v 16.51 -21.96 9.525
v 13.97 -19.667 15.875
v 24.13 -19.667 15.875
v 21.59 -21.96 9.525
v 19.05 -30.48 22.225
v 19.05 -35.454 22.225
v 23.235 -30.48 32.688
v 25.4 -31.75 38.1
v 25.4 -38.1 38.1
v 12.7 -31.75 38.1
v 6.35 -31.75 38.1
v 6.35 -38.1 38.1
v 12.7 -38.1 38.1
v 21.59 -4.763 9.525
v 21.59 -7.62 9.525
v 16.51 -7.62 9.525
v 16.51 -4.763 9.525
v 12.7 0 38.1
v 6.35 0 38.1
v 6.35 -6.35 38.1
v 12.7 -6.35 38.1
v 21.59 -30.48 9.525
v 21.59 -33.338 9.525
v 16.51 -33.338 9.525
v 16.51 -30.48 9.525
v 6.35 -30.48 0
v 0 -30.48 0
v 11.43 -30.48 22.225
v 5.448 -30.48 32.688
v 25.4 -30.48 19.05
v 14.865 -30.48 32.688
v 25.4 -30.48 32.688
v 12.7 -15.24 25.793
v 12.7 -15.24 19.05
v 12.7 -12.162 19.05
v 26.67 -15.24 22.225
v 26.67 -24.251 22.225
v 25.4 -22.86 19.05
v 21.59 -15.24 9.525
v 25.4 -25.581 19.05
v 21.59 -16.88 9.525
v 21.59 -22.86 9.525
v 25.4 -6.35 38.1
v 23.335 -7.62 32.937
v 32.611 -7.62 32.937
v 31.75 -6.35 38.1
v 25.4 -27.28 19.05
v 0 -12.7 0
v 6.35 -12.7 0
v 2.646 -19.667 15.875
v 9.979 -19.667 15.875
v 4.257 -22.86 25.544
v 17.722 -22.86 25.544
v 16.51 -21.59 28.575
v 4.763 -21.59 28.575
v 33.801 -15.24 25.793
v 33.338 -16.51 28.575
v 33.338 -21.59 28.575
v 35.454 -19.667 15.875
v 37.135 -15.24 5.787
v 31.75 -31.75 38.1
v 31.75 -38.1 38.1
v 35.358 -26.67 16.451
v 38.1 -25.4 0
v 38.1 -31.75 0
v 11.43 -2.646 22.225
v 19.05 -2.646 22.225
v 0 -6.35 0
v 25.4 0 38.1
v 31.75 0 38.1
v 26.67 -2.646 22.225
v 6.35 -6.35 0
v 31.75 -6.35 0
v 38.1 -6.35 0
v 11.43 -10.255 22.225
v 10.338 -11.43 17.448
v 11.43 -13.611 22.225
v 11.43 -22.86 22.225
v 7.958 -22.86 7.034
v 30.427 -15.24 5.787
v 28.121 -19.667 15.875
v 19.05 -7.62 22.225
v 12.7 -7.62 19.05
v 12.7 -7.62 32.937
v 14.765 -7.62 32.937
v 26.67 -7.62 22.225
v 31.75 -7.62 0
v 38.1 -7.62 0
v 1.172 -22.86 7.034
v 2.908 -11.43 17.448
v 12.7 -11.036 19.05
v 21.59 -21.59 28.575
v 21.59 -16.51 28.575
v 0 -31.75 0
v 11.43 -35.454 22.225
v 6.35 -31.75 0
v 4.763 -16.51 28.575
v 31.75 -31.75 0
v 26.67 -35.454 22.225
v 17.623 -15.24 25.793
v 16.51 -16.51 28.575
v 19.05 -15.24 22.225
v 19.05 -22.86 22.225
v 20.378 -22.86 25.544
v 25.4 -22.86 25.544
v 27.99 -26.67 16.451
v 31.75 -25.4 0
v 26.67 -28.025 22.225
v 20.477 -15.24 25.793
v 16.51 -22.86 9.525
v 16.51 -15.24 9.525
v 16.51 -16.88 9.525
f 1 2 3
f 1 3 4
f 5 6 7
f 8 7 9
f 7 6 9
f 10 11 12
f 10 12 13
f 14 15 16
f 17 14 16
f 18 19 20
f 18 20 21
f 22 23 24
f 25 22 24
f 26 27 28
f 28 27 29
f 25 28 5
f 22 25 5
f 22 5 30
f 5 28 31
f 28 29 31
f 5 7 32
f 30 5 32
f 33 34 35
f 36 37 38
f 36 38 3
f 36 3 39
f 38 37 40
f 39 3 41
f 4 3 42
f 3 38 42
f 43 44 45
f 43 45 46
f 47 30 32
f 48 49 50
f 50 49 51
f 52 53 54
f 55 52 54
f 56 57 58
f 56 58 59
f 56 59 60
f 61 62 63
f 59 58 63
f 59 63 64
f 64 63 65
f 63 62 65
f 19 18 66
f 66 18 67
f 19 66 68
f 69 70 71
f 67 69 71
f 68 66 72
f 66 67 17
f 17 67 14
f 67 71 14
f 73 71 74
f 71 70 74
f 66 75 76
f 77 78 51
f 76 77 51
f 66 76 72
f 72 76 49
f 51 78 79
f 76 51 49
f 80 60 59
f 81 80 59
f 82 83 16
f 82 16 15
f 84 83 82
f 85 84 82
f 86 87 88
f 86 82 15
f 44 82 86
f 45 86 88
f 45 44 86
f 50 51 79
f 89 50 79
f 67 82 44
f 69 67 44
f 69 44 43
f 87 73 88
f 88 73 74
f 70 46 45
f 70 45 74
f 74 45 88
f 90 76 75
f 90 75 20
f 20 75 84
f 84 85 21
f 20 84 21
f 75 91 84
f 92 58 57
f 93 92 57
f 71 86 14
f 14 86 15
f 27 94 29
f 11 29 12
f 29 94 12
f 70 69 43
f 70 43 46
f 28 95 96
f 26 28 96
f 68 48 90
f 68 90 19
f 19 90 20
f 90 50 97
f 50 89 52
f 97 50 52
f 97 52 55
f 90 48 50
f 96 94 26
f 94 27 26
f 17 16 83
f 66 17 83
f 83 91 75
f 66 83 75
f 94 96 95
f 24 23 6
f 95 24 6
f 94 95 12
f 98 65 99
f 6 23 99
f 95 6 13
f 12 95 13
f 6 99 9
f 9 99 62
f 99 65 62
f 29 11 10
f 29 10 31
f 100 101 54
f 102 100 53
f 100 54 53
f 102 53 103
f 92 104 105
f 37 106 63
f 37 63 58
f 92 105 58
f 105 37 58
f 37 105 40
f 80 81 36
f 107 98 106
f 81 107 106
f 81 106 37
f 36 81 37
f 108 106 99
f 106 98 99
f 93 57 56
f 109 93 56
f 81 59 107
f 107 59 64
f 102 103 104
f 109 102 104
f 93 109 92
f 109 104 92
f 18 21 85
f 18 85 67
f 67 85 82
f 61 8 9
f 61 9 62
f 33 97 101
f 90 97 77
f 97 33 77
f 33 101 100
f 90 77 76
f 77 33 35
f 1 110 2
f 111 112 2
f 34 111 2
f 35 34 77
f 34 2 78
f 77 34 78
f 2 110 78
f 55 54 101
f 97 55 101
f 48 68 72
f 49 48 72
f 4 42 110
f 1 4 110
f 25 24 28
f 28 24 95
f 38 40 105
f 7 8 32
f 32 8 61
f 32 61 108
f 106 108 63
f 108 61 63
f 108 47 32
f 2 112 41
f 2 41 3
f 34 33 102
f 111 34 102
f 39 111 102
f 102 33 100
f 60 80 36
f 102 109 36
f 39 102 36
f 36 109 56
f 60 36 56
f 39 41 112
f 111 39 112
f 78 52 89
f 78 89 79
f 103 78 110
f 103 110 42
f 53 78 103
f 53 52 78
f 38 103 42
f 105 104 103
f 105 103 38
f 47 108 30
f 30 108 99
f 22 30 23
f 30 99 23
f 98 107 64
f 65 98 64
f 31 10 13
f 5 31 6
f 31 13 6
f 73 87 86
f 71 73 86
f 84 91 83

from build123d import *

# Parameters (mm, degrees)
F0_W      = 38.1
F0_H      = 38.1
F1_DEPTH  = 38.1
F6_DEPTH  = 38.1
F8_DEPTH  = 38.1
F9_W      = 25.4
F9_H      = 7.62
F10_DEPTH = 38.1


with BuildPart() as f1:
    # F0 (on Front) → F1 (new body)
    with BuildSketch(Plane.XZ):
        with Locations((19.05, 19.05)):
            Rectangle(F0_W, F0_H)
    extrude(amount=F1_DEPTH)

    # F5 (on offset) → F6 (cut)
    with BuildSketch(Plane.YZ.offset(38.1)):
        Polygon((-31.75, 0), (-38.1, 38.1), (-38.1, 0), align=None)
        Polygon((-19.6671973258, 15.875), (-25.4, 0), (-12.7, 0), align=None)
        Polygon((-6.35, 38.1), (-31.75, 38.1), (-26.67, 16.4506547153), (-21.59, 28.575), (-16.51, 28.575), (-11.43, 17.4476634711), align=None)
        Polygon((0, 0), (0, 38.1), (-6.35, 0), align=None)
    extrude(amount=-F6_DEPTH, mode=Mode.SUBTRACT)

    # F7 (on offset) → F8 (cut)
    with BuildSketch(Plane.XZ.offset(38.1)):
        Polygon((0, 38.1), (0, 0), (6.35, 38.1), align=None)
        Polygon((25.4, 38.1), (12.7, 38.1), (19.05, 22.225), align=None)
        Polygon((11.43, 22.225), (6.35, 0), (31.75, 0), (26.67, 22.225), (21.59, 9.525), (16.51, 9.525), align=None)
        Polygon((31.75, 38.1), (38.1, 0), (38.1, 38.1), align=None)
    extrude(amount=-F8_DEPTH, mode=Mode.SUBTRACT)

    # F9 (on offset) → F10 (cut)
    with BuildSketch(Plane.XY.offset(38.1)):
        with Locations((25.4, -11.43)):
            Rectangle(F9_W, F9_H)
        with Locations((12.7, -26.67)):
            Rectangle(F9_W, F9_H)
    extrude(amount=-F10_DEPTH, mode=Mode.SUBTRACT)


solid = f1.part
